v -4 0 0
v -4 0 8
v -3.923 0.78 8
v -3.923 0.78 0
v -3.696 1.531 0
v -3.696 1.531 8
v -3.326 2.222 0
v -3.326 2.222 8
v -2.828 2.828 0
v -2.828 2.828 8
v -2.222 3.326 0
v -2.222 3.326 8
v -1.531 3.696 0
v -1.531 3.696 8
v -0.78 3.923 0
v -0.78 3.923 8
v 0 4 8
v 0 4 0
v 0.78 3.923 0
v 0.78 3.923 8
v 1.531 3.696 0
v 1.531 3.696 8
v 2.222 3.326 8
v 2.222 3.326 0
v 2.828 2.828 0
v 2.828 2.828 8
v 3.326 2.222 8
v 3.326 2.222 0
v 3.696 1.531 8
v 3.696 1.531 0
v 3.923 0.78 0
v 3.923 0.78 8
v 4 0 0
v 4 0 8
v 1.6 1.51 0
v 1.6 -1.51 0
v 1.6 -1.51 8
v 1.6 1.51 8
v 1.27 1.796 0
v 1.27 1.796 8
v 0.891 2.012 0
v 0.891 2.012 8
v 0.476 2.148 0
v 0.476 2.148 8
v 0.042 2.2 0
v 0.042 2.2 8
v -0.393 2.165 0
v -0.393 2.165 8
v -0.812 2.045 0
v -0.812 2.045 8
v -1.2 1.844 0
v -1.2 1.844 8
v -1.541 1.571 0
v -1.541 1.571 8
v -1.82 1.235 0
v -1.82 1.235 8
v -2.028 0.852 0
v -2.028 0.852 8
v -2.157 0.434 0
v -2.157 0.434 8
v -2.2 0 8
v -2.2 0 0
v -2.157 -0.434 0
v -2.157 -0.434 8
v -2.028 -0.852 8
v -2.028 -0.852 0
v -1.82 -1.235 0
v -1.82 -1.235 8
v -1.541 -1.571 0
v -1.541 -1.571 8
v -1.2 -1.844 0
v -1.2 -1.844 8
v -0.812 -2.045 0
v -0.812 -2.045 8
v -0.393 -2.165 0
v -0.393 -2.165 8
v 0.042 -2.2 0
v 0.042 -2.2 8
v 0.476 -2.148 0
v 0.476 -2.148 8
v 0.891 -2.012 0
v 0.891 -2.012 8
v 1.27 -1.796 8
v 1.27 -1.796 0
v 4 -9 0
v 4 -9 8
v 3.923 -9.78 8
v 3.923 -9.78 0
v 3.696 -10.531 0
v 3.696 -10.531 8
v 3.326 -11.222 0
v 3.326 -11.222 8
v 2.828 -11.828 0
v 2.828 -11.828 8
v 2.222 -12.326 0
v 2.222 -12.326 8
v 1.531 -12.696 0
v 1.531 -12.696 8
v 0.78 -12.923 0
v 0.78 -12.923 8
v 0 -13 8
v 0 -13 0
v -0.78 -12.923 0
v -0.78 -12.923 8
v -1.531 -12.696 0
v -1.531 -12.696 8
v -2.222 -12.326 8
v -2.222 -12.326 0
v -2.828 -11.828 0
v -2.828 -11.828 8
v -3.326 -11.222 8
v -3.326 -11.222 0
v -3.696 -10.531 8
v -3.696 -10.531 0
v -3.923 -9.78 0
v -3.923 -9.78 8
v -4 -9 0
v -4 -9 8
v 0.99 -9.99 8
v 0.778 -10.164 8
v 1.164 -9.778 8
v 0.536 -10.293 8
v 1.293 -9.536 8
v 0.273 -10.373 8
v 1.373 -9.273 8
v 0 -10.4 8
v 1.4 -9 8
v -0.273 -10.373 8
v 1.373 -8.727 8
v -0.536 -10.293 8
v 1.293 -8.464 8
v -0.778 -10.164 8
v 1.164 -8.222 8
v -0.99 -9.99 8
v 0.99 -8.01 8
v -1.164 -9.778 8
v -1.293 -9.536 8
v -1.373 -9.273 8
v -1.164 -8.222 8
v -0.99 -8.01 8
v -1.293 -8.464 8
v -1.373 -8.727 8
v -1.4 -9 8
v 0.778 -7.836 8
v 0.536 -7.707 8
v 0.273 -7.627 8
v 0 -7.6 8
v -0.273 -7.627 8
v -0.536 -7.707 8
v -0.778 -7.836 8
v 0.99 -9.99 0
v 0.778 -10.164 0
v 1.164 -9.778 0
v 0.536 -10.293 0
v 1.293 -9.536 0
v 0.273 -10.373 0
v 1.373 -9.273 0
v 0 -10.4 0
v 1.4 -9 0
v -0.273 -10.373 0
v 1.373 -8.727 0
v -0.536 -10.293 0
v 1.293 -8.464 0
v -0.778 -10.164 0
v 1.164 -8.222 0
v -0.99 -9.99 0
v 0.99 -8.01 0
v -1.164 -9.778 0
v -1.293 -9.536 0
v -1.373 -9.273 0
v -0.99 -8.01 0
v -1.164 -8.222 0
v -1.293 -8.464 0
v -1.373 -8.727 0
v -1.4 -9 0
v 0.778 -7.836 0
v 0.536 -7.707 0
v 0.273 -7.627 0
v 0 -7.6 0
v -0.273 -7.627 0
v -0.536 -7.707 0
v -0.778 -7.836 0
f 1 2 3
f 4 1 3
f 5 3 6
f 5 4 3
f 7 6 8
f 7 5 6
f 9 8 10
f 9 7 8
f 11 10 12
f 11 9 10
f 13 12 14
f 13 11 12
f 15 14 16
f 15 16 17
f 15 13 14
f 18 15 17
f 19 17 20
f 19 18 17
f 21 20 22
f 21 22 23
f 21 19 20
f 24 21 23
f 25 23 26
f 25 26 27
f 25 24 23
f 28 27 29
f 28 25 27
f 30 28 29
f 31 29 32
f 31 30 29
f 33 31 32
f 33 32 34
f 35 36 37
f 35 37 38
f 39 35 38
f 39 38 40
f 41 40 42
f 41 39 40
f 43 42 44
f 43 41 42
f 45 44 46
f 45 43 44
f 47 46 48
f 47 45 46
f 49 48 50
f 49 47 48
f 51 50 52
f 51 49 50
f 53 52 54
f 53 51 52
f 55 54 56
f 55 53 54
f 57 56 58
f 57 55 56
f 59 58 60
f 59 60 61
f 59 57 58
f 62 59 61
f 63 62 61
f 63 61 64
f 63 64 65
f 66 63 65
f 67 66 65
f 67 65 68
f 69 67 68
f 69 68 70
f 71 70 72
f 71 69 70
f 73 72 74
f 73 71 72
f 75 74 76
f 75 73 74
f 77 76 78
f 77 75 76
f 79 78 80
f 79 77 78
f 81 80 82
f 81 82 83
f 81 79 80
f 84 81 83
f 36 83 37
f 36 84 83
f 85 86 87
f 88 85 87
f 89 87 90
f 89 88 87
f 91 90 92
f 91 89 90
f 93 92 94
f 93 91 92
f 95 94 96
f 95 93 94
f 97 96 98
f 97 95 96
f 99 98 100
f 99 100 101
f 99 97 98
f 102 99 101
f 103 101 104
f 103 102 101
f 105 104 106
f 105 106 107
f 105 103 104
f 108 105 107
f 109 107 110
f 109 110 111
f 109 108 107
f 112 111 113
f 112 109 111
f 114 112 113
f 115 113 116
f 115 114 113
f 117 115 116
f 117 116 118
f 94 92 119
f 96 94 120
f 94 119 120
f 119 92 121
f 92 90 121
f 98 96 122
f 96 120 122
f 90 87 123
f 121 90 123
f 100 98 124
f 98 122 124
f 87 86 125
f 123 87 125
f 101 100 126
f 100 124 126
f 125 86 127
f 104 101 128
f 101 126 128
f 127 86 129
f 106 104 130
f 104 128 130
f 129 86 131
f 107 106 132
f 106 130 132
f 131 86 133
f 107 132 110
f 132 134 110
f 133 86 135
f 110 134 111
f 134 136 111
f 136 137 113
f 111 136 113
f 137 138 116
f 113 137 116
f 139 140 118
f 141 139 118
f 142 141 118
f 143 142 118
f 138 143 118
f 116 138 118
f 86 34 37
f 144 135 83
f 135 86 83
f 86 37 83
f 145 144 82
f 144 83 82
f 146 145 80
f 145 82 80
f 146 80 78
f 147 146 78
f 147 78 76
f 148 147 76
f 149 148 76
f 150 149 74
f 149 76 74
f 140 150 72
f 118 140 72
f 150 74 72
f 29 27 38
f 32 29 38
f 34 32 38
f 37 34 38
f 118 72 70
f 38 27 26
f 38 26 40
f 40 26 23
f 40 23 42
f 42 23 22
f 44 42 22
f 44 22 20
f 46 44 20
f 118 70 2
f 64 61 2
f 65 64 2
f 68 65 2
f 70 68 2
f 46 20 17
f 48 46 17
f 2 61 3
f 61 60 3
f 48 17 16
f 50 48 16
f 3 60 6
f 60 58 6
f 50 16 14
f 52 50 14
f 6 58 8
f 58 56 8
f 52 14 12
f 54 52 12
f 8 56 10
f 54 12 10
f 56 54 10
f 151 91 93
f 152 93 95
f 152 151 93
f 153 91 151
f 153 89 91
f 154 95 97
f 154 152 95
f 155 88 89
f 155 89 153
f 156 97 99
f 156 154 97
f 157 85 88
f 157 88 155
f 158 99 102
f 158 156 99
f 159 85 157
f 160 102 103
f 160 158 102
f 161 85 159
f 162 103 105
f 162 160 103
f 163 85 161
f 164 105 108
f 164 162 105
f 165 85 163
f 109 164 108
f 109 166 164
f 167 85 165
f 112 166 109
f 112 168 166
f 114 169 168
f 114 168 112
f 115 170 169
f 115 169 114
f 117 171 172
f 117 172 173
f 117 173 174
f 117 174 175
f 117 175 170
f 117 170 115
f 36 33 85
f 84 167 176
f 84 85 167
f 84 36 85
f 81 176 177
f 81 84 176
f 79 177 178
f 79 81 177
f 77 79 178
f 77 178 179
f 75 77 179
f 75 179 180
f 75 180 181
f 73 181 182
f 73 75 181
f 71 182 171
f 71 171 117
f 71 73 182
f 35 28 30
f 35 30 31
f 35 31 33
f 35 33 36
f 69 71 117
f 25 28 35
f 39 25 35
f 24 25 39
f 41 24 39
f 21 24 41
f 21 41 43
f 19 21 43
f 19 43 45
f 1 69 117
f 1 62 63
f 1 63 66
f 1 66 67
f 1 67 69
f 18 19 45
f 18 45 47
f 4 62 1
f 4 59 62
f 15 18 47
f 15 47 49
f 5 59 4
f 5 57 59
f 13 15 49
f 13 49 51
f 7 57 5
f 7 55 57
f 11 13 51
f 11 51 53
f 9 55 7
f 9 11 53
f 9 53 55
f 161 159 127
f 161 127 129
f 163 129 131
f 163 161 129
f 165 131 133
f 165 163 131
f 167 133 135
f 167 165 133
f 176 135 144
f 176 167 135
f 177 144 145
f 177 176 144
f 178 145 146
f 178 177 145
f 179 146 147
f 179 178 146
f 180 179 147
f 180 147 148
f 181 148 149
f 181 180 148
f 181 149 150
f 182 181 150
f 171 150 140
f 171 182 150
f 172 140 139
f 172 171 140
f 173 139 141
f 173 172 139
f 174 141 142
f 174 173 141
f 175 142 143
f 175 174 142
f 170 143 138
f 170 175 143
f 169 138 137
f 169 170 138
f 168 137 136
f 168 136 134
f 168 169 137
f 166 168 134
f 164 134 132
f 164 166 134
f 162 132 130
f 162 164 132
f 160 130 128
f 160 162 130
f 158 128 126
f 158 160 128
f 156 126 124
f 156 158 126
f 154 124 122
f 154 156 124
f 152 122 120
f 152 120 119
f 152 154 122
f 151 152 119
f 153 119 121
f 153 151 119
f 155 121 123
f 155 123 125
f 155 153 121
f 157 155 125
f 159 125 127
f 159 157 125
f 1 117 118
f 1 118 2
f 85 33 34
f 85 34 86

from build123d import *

# Parameters (mm, degrees)
EXTRUDE_2_DEPTH     = 8
SKETCH_1_6_R        = 1.4
CUT_EXTRUDE_2_DEPTH = 8


with BuildPart() as part:
    # 草图1 → 凸台-拉伸2 (new body)
    with BuildSketch(Plane.XY):
        with BuildLine():
            Line((4, 0), (4, -9))
            ThreePointArc((4, -9), (0, -13), (-4, -9))
            Line((-4, -9), (-4, 0))
            ThreePointArc((-4, 0), (0, 4), (4, 0))
        make_face()
    extrude(amount=EXTRUDE_2_DEPTH)

    # 草图1<6> → 切除-拉伸2 (cut)
    with BuildSketch(Plane.XY):
        with BuildLine():
            Line((1.6, -1.509966887), (1.6, 1.509966887))
            ThreePointArc((1.6, 1.509966887), (-2.2, 0), (1.6, -1.509966887))
        make_face()
        with Locations((0, -9)):
            Circle(SKETCH_1_6_R)
    extrude(amount=CUT_EXTRUDE_2_DEPTH, mode=Mode.SUBTRACT)


solid = part.part
